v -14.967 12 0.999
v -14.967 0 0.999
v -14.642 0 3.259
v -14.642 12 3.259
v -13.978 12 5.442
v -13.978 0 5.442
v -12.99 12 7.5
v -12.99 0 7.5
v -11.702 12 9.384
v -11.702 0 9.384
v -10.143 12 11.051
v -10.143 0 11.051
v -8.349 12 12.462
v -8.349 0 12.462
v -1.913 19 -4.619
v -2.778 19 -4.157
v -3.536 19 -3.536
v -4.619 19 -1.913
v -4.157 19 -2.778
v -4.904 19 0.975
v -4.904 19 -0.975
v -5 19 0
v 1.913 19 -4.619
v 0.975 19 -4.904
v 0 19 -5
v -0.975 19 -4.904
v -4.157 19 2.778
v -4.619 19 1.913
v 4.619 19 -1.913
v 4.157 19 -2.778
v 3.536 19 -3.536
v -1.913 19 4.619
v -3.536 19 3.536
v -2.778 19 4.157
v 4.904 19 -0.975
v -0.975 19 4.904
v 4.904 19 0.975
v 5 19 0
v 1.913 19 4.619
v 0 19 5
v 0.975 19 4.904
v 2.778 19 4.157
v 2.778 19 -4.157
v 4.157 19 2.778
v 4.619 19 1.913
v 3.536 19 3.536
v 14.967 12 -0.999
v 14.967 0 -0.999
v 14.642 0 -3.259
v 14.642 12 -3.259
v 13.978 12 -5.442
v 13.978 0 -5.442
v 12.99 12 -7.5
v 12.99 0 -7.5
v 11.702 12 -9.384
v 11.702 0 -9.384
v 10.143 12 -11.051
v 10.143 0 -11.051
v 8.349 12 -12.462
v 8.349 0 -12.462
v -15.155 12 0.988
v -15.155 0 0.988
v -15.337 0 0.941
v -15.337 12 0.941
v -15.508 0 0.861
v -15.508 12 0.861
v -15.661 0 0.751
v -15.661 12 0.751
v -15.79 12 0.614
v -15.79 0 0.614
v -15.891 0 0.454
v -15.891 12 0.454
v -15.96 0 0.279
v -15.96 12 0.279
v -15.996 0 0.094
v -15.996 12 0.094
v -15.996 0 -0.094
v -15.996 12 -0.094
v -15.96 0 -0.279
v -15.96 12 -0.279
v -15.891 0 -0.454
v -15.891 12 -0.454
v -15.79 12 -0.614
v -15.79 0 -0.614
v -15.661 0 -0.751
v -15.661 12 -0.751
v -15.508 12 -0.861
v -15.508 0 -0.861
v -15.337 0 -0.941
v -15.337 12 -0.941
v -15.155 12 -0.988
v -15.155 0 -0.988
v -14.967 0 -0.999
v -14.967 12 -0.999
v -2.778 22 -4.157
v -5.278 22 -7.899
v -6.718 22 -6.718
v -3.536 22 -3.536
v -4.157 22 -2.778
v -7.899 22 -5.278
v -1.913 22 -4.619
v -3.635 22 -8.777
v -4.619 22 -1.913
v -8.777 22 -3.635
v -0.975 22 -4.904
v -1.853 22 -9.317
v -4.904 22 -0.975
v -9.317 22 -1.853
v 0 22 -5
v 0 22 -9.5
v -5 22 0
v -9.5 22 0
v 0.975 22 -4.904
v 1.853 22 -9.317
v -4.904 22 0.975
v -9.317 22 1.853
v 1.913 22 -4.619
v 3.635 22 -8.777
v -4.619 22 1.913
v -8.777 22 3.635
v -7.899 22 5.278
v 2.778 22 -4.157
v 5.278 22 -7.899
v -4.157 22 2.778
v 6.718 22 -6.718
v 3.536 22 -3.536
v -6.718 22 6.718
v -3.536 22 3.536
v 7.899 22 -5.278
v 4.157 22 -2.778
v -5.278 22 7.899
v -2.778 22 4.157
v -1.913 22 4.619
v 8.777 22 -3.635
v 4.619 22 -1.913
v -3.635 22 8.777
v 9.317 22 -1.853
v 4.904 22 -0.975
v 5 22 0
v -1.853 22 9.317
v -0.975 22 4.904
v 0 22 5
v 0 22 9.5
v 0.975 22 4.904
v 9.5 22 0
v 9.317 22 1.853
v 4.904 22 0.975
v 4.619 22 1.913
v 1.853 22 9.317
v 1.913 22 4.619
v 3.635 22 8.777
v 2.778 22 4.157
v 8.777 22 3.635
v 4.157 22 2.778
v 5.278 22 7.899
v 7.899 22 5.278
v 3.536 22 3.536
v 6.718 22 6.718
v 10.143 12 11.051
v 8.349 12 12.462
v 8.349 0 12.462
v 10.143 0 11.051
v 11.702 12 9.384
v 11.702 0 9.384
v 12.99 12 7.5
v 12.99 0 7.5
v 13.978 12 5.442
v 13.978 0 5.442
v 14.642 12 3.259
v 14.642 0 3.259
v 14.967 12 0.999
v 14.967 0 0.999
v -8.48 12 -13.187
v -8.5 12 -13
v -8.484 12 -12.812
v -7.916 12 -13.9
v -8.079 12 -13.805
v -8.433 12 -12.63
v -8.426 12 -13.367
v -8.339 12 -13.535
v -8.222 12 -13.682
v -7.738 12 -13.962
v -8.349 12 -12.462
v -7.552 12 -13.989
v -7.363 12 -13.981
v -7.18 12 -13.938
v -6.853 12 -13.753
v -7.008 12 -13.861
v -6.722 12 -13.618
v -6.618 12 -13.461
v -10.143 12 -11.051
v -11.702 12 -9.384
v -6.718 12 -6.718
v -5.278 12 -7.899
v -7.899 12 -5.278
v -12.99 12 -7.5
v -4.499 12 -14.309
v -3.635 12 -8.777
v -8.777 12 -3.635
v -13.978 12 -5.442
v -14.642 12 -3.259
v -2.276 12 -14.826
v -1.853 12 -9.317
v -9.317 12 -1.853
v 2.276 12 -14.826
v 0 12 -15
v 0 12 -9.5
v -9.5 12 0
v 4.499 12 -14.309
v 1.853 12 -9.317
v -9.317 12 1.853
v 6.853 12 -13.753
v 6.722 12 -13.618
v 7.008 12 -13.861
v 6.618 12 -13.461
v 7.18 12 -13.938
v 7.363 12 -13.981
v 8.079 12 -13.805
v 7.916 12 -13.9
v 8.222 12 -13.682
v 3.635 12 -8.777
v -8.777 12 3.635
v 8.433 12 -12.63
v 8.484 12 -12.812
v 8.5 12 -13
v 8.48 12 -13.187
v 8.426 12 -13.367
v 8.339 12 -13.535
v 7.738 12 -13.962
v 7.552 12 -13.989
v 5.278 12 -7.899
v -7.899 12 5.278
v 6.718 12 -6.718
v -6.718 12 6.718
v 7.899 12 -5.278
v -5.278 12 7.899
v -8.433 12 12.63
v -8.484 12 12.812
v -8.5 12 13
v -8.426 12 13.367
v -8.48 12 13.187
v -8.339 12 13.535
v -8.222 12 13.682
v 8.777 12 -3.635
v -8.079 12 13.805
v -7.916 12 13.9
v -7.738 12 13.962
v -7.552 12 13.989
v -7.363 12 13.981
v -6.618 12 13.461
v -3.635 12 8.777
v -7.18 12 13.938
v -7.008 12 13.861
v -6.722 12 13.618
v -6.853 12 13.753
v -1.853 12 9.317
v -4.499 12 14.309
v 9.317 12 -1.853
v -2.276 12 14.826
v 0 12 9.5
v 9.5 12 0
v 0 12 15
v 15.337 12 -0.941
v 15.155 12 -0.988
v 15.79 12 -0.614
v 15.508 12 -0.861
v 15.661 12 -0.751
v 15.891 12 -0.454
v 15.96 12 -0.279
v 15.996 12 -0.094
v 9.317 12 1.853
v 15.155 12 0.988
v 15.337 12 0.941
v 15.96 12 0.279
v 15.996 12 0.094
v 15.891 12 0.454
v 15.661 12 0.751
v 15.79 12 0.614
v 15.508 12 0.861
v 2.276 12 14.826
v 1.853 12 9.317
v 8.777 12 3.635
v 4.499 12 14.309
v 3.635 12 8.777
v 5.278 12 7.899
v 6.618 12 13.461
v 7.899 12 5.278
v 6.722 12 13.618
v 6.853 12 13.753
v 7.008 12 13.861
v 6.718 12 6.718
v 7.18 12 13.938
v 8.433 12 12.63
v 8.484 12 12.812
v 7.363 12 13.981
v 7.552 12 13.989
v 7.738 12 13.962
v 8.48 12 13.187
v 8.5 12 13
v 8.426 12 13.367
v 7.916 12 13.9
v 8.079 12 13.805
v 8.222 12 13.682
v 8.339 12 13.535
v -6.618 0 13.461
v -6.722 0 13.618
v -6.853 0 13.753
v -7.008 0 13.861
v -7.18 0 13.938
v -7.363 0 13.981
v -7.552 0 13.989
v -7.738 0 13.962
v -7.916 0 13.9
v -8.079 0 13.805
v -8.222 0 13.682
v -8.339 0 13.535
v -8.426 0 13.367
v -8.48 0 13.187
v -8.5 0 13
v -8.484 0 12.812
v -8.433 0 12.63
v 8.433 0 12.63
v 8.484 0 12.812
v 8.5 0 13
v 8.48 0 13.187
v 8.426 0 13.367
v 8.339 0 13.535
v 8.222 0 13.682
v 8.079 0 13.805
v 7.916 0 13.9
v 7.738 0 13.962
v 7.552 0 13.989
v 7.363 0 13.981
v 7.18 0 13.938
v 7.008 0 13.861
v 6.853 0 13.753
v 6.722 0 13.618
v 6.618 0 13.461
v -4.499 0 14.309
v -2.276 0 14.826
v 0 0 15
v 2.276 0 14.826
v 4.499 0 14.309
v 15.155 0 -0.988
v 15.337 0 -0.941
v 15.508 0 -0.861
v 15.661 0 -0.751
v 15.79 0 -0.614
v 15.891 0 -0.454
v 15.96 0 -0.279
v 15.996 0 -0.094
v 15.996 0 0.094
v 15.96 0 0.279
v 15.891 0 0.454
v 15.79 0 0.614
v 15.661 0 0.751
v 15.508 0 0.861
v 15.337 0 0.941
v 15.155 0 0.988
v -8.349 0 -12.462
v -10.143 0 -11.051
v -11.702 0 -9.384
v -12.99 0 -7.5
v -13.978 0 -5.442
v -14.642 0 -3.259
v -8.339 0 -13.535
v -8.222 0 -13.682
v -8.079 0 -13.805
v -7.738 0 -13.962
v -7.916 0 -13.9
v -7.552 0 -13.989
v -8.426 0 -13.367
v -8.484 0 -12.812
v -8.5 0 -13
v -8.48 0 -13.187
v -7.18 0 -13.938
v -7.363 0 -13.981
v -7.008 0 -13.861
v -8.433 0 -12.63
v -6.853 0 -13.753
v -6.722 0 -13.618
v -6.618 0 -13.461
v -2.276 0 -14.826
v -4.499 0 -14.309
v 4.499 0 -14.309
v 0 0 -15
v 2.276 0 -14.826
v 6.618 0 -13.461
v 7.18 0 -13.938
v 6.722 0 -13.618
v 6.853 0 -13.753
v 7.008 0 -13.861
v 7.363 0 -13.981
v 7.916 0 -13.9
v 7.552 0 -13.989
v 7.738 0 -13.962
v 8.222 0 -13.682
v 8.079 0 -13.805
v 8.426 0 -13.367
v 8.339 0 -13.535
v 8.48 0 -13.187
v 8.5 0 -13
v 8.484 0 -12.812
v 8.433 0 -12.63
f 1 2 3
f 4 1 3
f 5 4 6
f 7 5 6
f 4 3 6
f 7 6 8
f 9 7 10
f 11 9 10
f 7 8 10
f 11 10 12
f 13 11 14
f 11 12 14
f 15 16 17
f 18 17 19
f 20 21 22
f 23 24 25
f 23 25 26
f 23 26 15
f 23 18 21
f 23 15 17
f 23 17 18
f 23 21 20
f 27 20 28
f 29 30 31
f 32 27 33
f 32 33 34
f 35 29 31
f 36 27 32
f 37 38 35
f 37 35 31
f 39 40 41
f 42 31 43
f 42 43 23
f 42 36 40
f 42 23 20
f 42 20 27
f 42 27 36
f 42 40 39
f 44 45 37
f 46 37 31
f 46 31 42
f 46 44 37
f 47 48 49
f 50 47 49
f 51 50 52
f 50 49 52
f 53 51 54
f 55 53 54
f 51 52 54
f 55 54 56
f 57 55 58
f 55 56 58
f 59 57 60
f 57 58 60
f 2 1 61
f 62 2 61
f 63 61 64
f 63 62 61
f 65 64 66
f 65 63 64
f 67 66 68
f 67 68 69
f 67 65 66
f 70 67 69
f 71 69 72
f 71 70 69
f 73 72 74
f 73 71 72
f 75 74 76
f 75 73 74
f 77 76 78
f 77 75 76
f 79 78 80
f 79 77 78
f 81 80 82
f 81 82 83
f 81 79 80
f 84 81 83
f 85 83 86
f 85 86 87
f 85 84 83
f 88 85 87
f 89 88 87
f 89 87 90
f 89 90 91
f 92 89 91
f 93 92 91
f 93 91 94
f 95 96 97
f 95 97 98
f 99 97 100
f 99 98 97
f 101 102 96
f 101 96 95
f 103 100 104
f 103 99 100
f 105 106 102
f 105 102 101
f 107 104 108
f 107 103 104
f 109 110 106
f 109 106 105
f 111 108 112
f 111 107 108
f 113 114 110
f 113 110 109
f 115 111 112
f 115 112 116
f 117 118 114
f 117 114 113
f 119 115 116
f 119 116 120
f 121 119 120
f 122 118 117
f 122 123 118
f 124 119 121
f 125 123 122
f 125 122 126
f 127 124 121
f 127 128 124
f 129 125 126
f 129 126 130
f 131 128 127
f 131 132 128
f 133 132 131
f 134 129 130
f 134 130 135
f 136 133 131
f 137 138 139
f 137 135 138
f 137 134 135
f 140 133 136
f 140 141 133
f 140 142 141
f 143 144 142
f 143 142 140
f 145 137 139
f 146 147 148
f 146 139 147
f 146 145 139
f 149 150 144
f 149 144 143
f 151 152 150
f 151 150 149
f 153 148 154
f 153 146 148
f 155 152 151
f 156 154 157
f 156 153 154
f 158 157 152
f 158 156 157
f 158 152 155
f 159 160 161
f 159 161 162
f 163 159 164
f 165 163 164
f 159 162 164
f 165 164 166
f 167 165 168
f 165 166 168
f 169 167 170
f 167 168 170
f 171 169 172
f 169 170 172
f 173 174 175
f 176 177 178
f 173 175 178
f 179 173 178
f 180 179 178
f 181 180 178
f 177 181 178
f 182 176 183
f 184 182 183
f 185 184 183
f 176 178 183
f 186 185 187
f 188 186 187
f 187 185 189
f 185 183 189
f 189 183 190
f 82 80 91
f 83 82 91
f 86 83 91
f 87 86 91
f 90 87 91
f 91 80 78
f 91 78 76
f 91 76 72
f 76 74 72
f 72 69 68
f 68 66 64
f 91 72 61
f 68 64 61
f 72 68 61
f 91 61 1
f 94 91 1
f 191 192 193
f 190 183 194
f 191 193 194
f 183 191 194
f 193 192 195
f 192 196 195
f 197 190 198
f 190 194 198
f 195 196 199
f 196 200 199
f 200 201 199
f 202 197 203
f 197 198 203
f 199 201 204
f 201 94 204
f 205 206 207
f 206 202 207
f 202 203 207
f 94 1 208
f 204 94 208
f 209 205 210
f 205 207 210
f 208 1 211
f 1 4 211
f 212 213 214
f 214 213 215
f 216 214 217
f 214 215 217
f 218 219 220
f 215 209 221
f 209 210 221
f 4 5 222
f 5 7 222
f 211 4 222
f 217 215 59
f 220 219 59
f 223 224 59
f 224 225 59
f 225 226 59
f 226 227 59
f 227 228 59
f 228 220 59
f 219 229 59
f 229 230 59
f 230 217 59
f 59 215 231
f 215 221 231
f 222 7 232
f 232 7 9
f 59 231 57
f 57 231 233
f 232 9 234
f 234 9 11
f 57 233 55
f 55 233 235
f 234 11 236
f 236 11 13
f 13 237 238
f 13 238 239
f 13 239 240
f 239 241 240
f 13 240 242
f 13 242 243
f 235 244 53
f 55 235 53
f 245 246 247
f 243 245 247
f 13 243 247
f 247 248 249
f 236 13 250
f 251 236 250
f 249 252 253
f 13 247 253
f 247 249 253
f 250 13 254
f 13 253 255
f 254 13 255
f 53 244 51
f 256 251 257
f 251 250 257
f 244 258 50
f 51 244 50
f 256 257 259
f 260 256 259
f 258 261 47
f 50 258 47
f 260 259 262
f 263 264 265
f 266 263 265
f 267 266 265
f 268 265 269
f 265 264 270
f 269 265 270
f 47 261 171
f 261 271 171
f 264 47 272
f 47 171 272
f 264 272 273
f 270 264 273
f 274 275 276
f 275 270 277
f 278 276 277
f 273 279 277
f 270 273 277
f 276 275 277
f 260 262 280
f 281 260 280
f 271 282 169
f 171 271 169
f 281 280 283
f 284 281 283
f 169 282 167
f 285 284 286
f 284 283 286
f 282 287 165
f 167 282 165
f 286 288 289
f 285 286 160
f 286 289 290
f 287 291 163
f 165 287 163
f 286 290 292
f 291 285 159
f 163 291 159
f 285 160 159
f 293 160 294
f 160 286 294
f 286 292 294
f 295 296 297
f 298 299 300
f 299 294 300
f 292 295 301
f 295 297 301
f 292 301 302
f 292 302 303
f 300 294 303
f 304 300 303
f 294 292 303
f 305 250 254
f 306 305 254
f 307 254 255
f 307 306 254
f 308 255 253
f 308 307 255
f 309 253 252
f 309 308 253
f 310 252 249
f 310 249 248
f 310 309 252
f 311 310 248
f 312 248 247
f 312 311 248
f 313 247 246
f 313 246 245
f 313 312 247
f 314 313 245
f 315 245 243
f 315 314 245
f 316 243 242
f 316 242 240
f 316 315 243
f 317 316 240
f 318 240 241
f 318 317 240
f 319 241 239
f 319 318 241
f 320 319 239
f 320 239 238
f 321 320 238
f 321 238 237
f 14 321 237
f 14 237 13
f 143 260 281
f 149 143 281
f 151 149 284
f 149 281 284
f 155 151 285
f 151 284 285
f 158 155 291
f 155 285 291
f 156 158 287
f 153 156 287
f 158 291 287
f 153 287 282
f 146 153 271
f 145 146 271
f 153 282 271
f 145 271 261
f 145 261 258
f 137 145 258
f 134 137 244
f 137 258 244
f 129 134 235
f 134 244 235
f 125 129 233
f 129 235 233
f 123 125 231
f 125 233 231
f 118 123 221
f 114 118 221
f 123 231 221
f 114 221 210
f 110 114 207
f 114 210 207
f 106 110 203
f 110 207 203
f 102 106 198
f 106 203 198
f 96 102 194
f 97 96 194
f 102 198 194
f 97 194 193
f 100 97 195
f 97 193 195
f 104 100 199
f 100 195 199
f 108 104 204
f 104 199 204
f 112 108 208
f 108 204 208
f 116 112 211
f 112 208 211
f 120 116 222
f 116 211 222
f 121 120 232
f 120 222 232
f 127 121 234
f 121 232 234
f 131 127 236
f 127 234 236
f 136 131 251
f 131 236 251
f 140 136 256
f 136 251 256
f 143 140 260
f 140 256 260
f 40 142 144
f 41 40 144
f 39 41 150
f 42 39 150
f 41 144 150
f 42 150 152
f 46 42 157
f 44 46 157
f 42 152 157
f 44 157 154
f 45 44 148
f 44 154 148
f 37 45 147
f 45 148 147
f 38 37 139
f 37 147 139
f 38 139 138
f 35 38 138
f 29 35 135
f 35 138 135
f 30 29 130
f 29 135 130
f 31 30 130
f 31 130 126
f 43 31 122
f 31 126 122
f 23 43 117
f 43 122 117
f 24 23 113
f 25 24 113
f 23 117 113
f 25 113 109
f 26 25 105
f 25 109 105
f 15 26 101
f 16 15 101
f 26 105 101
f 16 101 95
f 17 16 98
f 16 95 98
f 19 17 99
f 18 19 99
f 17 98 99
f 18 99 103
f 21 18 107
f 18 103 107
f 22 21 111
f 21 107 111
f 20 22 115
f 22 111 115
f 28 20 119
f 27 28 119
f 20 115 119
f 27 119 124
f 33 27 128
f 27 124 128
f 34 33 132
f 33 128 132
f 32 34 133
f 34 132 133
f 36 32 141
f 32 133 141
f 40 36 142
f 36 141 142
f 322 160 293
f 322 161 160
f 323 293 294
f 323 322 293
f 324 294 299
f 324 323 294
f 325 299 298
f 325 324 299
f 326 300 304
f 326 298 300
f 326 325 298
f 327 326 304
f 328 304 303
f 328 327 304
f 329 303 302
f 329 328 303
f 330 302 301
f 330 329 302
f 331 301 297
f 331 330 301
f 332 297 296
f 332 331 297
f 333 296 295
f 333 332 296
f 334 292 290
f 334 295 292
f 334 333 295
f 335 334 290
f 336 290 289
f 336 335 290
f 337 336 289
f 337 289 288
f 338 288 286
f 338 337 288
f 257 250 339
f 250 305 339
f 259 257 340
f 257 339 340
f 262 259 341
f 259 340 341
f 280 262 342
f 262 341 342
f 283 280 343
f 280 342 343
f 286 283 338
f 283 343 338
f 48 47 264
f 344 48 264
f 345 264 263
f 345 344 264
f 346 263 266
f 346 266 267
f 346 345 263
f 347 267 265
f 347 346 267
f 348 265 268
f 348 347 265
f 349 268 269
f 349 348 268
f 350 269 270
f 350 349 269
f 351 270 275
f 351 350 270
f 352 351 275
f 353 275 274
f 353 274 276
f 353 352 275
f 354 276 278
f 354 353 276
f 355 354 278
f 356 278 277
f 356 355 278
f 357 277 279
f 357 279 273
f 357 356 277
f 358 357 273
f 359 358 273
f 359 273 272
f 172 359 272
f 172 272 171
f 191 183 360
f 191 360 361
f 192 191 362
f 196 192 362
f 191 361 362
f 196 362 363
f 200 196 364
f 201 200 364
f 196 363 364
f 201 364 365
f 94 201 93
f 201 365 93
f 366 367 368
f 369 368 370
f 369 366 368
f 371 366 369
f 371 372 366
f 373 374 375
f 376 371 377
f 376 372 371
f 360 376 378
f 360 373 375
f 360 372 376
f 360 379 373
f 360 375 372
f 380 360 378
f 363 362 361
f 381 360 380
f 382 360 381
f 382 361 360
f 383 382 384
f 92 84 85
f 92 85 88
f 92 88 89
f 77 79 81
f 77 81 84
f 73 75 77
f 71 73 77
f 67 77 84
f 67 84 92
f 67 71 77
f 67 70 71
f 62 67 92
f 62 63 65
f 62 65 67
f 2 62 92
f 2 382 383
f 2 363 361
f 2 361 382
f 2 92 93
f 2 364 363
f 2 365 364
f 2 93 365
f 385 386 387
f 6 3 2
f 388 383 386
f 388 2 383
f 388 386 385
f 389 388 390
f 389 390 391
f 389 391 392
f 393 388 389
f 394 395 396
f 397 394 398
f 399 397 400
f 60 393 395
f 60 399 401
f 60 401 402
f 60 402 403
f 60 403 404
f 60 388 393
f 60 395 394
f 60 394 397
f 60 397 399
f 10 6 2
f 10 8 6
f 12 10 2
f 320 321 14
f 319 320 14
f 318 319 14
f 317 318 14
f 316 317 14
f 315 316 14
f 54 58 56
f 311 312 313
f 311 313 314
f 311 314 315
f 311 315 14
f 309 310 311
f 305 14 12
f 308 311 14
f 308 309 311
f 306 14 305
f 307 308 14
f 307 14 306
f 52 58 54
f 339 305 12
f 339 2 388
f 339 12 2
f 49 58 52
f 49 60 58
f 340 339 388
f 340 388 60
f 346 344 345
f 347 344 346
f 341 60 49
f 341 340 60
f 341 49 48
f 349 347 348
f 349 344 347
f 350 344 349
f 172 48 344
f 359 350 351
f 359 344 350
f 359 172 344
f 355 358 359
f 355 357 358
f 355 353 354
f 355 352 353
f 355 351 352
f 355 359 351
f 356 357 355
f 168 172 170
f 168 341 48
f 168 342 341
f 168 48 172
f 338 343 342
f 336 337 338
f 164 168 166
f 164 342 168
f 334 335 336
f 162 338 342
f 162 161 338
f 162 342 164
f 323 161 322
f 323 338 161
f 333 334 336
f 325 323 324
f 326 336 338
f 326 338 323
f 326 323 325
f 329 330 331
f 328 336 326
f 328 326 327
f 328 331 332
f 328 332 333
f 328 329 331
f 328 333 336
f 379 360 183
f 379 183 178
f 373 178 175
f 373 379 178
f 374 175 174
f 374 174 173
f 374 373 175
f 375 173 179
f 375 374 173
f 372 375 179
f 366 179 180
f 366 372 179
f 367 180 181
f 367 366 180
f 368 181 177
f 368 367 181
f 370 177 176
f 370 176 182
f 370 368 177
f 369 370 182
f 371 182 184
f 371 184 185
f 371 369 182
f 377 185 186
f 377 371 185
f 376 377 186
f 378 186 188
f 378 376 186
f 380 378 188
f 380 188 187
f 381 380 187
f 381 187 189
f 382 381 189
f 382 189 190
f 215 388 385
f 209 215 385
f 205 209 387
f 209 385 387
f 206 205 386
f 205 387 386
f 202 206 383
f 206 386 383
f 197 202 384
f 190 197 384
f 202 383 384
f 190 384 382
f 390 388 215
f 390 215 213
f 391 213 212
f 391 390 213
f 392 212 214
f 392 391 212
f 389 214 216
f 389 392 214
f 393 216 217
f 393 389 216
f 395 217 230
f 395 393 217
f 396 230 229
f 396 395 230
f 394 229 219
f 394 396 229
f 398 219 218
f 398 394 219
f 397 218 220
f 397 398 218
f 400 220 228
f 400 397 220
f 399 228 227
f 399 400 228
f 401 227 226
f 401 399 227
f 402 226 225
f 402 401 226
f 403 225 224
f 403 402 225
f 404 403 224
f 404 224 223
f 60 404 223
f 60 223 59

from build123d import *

# Parameters (mm, degrees)
SKETCH1_R           = 15
BOSS_EXTRUDE1_DEPTH = 12
SKETCH2_R           = 9.5
BOSS_EXTRUDE2_DEPTH = 10
SKETCH3_R           = 5
CUT_EXTRUDE1_DEPTH  = 3
SKETCH4_R           = 1
BOSS_EXTRUDE3_DEPTH = 12


with BuildPart() as part:
    # Sketch1 → Boss-Extrude1 (new body)
    with BuildSketch(Plane(origin=(0, 0, 0), x_dir=(1, 0, 0), z_dir=(0, 1, 0))):
        with Locations(Location((0, 0, 0), (0, 0, 270))):
            Circle(SKETCH1_R)
    extrude(amount=BOSS_EXTRUDE1_DEPTH)

    # Sketch2 → Boss-Extrude2 (add)
    with BuildSketch(Plane(origin=(0, 12, 0), x_dir=(1, 0, 0), z_dir=(0, 1, 0))):
        with Locations(Location((0, 0, 0), (0, 0, 270))):
            Circle(SKETCH2_R)
    extrude(amount=BOSS_EXTRUDE2_DEPTH)

    # Sketch3 → Cut-Extrude1 (cut)
    with BuildSketch(Plane(origin=(0, 22, 0), x_dir=(1, 0, 0), z_dir=(0, 1, 0))):
        with Locations(Location((0, 0, 0), (0, 0, 270))):
            Circle(SKETCH3_R)
    extrude(amount=-CUT_EXTRUDE1_DEPTH, mode=Mode.SUBTRACT)

    # Sketch4 → Boss-Extrude3 (add)
    with BuildSketch(Plane.XZ):
        with Locations((15, 0)):
            Circle(SKETCH4_R)
        with Locations((7.5, -12.990381057)):
            Circle(SKETCH4_R)
        with Locations((-7.5, -12.990381057)):
            Circle(SKETCH4_R)
        with Locations((-15, 0)):
            Circle(SKETCH4_R)
        with Locations((-7.5, 12.990381057)):
            Circle(SKETCH4_R)
        with Locations((7.5, 12.990381057)):
            Circle(SKETCH4_R)
    extrude(amount=-BOSS_EXTRUDE3_DEPTH)


solid = part.part
